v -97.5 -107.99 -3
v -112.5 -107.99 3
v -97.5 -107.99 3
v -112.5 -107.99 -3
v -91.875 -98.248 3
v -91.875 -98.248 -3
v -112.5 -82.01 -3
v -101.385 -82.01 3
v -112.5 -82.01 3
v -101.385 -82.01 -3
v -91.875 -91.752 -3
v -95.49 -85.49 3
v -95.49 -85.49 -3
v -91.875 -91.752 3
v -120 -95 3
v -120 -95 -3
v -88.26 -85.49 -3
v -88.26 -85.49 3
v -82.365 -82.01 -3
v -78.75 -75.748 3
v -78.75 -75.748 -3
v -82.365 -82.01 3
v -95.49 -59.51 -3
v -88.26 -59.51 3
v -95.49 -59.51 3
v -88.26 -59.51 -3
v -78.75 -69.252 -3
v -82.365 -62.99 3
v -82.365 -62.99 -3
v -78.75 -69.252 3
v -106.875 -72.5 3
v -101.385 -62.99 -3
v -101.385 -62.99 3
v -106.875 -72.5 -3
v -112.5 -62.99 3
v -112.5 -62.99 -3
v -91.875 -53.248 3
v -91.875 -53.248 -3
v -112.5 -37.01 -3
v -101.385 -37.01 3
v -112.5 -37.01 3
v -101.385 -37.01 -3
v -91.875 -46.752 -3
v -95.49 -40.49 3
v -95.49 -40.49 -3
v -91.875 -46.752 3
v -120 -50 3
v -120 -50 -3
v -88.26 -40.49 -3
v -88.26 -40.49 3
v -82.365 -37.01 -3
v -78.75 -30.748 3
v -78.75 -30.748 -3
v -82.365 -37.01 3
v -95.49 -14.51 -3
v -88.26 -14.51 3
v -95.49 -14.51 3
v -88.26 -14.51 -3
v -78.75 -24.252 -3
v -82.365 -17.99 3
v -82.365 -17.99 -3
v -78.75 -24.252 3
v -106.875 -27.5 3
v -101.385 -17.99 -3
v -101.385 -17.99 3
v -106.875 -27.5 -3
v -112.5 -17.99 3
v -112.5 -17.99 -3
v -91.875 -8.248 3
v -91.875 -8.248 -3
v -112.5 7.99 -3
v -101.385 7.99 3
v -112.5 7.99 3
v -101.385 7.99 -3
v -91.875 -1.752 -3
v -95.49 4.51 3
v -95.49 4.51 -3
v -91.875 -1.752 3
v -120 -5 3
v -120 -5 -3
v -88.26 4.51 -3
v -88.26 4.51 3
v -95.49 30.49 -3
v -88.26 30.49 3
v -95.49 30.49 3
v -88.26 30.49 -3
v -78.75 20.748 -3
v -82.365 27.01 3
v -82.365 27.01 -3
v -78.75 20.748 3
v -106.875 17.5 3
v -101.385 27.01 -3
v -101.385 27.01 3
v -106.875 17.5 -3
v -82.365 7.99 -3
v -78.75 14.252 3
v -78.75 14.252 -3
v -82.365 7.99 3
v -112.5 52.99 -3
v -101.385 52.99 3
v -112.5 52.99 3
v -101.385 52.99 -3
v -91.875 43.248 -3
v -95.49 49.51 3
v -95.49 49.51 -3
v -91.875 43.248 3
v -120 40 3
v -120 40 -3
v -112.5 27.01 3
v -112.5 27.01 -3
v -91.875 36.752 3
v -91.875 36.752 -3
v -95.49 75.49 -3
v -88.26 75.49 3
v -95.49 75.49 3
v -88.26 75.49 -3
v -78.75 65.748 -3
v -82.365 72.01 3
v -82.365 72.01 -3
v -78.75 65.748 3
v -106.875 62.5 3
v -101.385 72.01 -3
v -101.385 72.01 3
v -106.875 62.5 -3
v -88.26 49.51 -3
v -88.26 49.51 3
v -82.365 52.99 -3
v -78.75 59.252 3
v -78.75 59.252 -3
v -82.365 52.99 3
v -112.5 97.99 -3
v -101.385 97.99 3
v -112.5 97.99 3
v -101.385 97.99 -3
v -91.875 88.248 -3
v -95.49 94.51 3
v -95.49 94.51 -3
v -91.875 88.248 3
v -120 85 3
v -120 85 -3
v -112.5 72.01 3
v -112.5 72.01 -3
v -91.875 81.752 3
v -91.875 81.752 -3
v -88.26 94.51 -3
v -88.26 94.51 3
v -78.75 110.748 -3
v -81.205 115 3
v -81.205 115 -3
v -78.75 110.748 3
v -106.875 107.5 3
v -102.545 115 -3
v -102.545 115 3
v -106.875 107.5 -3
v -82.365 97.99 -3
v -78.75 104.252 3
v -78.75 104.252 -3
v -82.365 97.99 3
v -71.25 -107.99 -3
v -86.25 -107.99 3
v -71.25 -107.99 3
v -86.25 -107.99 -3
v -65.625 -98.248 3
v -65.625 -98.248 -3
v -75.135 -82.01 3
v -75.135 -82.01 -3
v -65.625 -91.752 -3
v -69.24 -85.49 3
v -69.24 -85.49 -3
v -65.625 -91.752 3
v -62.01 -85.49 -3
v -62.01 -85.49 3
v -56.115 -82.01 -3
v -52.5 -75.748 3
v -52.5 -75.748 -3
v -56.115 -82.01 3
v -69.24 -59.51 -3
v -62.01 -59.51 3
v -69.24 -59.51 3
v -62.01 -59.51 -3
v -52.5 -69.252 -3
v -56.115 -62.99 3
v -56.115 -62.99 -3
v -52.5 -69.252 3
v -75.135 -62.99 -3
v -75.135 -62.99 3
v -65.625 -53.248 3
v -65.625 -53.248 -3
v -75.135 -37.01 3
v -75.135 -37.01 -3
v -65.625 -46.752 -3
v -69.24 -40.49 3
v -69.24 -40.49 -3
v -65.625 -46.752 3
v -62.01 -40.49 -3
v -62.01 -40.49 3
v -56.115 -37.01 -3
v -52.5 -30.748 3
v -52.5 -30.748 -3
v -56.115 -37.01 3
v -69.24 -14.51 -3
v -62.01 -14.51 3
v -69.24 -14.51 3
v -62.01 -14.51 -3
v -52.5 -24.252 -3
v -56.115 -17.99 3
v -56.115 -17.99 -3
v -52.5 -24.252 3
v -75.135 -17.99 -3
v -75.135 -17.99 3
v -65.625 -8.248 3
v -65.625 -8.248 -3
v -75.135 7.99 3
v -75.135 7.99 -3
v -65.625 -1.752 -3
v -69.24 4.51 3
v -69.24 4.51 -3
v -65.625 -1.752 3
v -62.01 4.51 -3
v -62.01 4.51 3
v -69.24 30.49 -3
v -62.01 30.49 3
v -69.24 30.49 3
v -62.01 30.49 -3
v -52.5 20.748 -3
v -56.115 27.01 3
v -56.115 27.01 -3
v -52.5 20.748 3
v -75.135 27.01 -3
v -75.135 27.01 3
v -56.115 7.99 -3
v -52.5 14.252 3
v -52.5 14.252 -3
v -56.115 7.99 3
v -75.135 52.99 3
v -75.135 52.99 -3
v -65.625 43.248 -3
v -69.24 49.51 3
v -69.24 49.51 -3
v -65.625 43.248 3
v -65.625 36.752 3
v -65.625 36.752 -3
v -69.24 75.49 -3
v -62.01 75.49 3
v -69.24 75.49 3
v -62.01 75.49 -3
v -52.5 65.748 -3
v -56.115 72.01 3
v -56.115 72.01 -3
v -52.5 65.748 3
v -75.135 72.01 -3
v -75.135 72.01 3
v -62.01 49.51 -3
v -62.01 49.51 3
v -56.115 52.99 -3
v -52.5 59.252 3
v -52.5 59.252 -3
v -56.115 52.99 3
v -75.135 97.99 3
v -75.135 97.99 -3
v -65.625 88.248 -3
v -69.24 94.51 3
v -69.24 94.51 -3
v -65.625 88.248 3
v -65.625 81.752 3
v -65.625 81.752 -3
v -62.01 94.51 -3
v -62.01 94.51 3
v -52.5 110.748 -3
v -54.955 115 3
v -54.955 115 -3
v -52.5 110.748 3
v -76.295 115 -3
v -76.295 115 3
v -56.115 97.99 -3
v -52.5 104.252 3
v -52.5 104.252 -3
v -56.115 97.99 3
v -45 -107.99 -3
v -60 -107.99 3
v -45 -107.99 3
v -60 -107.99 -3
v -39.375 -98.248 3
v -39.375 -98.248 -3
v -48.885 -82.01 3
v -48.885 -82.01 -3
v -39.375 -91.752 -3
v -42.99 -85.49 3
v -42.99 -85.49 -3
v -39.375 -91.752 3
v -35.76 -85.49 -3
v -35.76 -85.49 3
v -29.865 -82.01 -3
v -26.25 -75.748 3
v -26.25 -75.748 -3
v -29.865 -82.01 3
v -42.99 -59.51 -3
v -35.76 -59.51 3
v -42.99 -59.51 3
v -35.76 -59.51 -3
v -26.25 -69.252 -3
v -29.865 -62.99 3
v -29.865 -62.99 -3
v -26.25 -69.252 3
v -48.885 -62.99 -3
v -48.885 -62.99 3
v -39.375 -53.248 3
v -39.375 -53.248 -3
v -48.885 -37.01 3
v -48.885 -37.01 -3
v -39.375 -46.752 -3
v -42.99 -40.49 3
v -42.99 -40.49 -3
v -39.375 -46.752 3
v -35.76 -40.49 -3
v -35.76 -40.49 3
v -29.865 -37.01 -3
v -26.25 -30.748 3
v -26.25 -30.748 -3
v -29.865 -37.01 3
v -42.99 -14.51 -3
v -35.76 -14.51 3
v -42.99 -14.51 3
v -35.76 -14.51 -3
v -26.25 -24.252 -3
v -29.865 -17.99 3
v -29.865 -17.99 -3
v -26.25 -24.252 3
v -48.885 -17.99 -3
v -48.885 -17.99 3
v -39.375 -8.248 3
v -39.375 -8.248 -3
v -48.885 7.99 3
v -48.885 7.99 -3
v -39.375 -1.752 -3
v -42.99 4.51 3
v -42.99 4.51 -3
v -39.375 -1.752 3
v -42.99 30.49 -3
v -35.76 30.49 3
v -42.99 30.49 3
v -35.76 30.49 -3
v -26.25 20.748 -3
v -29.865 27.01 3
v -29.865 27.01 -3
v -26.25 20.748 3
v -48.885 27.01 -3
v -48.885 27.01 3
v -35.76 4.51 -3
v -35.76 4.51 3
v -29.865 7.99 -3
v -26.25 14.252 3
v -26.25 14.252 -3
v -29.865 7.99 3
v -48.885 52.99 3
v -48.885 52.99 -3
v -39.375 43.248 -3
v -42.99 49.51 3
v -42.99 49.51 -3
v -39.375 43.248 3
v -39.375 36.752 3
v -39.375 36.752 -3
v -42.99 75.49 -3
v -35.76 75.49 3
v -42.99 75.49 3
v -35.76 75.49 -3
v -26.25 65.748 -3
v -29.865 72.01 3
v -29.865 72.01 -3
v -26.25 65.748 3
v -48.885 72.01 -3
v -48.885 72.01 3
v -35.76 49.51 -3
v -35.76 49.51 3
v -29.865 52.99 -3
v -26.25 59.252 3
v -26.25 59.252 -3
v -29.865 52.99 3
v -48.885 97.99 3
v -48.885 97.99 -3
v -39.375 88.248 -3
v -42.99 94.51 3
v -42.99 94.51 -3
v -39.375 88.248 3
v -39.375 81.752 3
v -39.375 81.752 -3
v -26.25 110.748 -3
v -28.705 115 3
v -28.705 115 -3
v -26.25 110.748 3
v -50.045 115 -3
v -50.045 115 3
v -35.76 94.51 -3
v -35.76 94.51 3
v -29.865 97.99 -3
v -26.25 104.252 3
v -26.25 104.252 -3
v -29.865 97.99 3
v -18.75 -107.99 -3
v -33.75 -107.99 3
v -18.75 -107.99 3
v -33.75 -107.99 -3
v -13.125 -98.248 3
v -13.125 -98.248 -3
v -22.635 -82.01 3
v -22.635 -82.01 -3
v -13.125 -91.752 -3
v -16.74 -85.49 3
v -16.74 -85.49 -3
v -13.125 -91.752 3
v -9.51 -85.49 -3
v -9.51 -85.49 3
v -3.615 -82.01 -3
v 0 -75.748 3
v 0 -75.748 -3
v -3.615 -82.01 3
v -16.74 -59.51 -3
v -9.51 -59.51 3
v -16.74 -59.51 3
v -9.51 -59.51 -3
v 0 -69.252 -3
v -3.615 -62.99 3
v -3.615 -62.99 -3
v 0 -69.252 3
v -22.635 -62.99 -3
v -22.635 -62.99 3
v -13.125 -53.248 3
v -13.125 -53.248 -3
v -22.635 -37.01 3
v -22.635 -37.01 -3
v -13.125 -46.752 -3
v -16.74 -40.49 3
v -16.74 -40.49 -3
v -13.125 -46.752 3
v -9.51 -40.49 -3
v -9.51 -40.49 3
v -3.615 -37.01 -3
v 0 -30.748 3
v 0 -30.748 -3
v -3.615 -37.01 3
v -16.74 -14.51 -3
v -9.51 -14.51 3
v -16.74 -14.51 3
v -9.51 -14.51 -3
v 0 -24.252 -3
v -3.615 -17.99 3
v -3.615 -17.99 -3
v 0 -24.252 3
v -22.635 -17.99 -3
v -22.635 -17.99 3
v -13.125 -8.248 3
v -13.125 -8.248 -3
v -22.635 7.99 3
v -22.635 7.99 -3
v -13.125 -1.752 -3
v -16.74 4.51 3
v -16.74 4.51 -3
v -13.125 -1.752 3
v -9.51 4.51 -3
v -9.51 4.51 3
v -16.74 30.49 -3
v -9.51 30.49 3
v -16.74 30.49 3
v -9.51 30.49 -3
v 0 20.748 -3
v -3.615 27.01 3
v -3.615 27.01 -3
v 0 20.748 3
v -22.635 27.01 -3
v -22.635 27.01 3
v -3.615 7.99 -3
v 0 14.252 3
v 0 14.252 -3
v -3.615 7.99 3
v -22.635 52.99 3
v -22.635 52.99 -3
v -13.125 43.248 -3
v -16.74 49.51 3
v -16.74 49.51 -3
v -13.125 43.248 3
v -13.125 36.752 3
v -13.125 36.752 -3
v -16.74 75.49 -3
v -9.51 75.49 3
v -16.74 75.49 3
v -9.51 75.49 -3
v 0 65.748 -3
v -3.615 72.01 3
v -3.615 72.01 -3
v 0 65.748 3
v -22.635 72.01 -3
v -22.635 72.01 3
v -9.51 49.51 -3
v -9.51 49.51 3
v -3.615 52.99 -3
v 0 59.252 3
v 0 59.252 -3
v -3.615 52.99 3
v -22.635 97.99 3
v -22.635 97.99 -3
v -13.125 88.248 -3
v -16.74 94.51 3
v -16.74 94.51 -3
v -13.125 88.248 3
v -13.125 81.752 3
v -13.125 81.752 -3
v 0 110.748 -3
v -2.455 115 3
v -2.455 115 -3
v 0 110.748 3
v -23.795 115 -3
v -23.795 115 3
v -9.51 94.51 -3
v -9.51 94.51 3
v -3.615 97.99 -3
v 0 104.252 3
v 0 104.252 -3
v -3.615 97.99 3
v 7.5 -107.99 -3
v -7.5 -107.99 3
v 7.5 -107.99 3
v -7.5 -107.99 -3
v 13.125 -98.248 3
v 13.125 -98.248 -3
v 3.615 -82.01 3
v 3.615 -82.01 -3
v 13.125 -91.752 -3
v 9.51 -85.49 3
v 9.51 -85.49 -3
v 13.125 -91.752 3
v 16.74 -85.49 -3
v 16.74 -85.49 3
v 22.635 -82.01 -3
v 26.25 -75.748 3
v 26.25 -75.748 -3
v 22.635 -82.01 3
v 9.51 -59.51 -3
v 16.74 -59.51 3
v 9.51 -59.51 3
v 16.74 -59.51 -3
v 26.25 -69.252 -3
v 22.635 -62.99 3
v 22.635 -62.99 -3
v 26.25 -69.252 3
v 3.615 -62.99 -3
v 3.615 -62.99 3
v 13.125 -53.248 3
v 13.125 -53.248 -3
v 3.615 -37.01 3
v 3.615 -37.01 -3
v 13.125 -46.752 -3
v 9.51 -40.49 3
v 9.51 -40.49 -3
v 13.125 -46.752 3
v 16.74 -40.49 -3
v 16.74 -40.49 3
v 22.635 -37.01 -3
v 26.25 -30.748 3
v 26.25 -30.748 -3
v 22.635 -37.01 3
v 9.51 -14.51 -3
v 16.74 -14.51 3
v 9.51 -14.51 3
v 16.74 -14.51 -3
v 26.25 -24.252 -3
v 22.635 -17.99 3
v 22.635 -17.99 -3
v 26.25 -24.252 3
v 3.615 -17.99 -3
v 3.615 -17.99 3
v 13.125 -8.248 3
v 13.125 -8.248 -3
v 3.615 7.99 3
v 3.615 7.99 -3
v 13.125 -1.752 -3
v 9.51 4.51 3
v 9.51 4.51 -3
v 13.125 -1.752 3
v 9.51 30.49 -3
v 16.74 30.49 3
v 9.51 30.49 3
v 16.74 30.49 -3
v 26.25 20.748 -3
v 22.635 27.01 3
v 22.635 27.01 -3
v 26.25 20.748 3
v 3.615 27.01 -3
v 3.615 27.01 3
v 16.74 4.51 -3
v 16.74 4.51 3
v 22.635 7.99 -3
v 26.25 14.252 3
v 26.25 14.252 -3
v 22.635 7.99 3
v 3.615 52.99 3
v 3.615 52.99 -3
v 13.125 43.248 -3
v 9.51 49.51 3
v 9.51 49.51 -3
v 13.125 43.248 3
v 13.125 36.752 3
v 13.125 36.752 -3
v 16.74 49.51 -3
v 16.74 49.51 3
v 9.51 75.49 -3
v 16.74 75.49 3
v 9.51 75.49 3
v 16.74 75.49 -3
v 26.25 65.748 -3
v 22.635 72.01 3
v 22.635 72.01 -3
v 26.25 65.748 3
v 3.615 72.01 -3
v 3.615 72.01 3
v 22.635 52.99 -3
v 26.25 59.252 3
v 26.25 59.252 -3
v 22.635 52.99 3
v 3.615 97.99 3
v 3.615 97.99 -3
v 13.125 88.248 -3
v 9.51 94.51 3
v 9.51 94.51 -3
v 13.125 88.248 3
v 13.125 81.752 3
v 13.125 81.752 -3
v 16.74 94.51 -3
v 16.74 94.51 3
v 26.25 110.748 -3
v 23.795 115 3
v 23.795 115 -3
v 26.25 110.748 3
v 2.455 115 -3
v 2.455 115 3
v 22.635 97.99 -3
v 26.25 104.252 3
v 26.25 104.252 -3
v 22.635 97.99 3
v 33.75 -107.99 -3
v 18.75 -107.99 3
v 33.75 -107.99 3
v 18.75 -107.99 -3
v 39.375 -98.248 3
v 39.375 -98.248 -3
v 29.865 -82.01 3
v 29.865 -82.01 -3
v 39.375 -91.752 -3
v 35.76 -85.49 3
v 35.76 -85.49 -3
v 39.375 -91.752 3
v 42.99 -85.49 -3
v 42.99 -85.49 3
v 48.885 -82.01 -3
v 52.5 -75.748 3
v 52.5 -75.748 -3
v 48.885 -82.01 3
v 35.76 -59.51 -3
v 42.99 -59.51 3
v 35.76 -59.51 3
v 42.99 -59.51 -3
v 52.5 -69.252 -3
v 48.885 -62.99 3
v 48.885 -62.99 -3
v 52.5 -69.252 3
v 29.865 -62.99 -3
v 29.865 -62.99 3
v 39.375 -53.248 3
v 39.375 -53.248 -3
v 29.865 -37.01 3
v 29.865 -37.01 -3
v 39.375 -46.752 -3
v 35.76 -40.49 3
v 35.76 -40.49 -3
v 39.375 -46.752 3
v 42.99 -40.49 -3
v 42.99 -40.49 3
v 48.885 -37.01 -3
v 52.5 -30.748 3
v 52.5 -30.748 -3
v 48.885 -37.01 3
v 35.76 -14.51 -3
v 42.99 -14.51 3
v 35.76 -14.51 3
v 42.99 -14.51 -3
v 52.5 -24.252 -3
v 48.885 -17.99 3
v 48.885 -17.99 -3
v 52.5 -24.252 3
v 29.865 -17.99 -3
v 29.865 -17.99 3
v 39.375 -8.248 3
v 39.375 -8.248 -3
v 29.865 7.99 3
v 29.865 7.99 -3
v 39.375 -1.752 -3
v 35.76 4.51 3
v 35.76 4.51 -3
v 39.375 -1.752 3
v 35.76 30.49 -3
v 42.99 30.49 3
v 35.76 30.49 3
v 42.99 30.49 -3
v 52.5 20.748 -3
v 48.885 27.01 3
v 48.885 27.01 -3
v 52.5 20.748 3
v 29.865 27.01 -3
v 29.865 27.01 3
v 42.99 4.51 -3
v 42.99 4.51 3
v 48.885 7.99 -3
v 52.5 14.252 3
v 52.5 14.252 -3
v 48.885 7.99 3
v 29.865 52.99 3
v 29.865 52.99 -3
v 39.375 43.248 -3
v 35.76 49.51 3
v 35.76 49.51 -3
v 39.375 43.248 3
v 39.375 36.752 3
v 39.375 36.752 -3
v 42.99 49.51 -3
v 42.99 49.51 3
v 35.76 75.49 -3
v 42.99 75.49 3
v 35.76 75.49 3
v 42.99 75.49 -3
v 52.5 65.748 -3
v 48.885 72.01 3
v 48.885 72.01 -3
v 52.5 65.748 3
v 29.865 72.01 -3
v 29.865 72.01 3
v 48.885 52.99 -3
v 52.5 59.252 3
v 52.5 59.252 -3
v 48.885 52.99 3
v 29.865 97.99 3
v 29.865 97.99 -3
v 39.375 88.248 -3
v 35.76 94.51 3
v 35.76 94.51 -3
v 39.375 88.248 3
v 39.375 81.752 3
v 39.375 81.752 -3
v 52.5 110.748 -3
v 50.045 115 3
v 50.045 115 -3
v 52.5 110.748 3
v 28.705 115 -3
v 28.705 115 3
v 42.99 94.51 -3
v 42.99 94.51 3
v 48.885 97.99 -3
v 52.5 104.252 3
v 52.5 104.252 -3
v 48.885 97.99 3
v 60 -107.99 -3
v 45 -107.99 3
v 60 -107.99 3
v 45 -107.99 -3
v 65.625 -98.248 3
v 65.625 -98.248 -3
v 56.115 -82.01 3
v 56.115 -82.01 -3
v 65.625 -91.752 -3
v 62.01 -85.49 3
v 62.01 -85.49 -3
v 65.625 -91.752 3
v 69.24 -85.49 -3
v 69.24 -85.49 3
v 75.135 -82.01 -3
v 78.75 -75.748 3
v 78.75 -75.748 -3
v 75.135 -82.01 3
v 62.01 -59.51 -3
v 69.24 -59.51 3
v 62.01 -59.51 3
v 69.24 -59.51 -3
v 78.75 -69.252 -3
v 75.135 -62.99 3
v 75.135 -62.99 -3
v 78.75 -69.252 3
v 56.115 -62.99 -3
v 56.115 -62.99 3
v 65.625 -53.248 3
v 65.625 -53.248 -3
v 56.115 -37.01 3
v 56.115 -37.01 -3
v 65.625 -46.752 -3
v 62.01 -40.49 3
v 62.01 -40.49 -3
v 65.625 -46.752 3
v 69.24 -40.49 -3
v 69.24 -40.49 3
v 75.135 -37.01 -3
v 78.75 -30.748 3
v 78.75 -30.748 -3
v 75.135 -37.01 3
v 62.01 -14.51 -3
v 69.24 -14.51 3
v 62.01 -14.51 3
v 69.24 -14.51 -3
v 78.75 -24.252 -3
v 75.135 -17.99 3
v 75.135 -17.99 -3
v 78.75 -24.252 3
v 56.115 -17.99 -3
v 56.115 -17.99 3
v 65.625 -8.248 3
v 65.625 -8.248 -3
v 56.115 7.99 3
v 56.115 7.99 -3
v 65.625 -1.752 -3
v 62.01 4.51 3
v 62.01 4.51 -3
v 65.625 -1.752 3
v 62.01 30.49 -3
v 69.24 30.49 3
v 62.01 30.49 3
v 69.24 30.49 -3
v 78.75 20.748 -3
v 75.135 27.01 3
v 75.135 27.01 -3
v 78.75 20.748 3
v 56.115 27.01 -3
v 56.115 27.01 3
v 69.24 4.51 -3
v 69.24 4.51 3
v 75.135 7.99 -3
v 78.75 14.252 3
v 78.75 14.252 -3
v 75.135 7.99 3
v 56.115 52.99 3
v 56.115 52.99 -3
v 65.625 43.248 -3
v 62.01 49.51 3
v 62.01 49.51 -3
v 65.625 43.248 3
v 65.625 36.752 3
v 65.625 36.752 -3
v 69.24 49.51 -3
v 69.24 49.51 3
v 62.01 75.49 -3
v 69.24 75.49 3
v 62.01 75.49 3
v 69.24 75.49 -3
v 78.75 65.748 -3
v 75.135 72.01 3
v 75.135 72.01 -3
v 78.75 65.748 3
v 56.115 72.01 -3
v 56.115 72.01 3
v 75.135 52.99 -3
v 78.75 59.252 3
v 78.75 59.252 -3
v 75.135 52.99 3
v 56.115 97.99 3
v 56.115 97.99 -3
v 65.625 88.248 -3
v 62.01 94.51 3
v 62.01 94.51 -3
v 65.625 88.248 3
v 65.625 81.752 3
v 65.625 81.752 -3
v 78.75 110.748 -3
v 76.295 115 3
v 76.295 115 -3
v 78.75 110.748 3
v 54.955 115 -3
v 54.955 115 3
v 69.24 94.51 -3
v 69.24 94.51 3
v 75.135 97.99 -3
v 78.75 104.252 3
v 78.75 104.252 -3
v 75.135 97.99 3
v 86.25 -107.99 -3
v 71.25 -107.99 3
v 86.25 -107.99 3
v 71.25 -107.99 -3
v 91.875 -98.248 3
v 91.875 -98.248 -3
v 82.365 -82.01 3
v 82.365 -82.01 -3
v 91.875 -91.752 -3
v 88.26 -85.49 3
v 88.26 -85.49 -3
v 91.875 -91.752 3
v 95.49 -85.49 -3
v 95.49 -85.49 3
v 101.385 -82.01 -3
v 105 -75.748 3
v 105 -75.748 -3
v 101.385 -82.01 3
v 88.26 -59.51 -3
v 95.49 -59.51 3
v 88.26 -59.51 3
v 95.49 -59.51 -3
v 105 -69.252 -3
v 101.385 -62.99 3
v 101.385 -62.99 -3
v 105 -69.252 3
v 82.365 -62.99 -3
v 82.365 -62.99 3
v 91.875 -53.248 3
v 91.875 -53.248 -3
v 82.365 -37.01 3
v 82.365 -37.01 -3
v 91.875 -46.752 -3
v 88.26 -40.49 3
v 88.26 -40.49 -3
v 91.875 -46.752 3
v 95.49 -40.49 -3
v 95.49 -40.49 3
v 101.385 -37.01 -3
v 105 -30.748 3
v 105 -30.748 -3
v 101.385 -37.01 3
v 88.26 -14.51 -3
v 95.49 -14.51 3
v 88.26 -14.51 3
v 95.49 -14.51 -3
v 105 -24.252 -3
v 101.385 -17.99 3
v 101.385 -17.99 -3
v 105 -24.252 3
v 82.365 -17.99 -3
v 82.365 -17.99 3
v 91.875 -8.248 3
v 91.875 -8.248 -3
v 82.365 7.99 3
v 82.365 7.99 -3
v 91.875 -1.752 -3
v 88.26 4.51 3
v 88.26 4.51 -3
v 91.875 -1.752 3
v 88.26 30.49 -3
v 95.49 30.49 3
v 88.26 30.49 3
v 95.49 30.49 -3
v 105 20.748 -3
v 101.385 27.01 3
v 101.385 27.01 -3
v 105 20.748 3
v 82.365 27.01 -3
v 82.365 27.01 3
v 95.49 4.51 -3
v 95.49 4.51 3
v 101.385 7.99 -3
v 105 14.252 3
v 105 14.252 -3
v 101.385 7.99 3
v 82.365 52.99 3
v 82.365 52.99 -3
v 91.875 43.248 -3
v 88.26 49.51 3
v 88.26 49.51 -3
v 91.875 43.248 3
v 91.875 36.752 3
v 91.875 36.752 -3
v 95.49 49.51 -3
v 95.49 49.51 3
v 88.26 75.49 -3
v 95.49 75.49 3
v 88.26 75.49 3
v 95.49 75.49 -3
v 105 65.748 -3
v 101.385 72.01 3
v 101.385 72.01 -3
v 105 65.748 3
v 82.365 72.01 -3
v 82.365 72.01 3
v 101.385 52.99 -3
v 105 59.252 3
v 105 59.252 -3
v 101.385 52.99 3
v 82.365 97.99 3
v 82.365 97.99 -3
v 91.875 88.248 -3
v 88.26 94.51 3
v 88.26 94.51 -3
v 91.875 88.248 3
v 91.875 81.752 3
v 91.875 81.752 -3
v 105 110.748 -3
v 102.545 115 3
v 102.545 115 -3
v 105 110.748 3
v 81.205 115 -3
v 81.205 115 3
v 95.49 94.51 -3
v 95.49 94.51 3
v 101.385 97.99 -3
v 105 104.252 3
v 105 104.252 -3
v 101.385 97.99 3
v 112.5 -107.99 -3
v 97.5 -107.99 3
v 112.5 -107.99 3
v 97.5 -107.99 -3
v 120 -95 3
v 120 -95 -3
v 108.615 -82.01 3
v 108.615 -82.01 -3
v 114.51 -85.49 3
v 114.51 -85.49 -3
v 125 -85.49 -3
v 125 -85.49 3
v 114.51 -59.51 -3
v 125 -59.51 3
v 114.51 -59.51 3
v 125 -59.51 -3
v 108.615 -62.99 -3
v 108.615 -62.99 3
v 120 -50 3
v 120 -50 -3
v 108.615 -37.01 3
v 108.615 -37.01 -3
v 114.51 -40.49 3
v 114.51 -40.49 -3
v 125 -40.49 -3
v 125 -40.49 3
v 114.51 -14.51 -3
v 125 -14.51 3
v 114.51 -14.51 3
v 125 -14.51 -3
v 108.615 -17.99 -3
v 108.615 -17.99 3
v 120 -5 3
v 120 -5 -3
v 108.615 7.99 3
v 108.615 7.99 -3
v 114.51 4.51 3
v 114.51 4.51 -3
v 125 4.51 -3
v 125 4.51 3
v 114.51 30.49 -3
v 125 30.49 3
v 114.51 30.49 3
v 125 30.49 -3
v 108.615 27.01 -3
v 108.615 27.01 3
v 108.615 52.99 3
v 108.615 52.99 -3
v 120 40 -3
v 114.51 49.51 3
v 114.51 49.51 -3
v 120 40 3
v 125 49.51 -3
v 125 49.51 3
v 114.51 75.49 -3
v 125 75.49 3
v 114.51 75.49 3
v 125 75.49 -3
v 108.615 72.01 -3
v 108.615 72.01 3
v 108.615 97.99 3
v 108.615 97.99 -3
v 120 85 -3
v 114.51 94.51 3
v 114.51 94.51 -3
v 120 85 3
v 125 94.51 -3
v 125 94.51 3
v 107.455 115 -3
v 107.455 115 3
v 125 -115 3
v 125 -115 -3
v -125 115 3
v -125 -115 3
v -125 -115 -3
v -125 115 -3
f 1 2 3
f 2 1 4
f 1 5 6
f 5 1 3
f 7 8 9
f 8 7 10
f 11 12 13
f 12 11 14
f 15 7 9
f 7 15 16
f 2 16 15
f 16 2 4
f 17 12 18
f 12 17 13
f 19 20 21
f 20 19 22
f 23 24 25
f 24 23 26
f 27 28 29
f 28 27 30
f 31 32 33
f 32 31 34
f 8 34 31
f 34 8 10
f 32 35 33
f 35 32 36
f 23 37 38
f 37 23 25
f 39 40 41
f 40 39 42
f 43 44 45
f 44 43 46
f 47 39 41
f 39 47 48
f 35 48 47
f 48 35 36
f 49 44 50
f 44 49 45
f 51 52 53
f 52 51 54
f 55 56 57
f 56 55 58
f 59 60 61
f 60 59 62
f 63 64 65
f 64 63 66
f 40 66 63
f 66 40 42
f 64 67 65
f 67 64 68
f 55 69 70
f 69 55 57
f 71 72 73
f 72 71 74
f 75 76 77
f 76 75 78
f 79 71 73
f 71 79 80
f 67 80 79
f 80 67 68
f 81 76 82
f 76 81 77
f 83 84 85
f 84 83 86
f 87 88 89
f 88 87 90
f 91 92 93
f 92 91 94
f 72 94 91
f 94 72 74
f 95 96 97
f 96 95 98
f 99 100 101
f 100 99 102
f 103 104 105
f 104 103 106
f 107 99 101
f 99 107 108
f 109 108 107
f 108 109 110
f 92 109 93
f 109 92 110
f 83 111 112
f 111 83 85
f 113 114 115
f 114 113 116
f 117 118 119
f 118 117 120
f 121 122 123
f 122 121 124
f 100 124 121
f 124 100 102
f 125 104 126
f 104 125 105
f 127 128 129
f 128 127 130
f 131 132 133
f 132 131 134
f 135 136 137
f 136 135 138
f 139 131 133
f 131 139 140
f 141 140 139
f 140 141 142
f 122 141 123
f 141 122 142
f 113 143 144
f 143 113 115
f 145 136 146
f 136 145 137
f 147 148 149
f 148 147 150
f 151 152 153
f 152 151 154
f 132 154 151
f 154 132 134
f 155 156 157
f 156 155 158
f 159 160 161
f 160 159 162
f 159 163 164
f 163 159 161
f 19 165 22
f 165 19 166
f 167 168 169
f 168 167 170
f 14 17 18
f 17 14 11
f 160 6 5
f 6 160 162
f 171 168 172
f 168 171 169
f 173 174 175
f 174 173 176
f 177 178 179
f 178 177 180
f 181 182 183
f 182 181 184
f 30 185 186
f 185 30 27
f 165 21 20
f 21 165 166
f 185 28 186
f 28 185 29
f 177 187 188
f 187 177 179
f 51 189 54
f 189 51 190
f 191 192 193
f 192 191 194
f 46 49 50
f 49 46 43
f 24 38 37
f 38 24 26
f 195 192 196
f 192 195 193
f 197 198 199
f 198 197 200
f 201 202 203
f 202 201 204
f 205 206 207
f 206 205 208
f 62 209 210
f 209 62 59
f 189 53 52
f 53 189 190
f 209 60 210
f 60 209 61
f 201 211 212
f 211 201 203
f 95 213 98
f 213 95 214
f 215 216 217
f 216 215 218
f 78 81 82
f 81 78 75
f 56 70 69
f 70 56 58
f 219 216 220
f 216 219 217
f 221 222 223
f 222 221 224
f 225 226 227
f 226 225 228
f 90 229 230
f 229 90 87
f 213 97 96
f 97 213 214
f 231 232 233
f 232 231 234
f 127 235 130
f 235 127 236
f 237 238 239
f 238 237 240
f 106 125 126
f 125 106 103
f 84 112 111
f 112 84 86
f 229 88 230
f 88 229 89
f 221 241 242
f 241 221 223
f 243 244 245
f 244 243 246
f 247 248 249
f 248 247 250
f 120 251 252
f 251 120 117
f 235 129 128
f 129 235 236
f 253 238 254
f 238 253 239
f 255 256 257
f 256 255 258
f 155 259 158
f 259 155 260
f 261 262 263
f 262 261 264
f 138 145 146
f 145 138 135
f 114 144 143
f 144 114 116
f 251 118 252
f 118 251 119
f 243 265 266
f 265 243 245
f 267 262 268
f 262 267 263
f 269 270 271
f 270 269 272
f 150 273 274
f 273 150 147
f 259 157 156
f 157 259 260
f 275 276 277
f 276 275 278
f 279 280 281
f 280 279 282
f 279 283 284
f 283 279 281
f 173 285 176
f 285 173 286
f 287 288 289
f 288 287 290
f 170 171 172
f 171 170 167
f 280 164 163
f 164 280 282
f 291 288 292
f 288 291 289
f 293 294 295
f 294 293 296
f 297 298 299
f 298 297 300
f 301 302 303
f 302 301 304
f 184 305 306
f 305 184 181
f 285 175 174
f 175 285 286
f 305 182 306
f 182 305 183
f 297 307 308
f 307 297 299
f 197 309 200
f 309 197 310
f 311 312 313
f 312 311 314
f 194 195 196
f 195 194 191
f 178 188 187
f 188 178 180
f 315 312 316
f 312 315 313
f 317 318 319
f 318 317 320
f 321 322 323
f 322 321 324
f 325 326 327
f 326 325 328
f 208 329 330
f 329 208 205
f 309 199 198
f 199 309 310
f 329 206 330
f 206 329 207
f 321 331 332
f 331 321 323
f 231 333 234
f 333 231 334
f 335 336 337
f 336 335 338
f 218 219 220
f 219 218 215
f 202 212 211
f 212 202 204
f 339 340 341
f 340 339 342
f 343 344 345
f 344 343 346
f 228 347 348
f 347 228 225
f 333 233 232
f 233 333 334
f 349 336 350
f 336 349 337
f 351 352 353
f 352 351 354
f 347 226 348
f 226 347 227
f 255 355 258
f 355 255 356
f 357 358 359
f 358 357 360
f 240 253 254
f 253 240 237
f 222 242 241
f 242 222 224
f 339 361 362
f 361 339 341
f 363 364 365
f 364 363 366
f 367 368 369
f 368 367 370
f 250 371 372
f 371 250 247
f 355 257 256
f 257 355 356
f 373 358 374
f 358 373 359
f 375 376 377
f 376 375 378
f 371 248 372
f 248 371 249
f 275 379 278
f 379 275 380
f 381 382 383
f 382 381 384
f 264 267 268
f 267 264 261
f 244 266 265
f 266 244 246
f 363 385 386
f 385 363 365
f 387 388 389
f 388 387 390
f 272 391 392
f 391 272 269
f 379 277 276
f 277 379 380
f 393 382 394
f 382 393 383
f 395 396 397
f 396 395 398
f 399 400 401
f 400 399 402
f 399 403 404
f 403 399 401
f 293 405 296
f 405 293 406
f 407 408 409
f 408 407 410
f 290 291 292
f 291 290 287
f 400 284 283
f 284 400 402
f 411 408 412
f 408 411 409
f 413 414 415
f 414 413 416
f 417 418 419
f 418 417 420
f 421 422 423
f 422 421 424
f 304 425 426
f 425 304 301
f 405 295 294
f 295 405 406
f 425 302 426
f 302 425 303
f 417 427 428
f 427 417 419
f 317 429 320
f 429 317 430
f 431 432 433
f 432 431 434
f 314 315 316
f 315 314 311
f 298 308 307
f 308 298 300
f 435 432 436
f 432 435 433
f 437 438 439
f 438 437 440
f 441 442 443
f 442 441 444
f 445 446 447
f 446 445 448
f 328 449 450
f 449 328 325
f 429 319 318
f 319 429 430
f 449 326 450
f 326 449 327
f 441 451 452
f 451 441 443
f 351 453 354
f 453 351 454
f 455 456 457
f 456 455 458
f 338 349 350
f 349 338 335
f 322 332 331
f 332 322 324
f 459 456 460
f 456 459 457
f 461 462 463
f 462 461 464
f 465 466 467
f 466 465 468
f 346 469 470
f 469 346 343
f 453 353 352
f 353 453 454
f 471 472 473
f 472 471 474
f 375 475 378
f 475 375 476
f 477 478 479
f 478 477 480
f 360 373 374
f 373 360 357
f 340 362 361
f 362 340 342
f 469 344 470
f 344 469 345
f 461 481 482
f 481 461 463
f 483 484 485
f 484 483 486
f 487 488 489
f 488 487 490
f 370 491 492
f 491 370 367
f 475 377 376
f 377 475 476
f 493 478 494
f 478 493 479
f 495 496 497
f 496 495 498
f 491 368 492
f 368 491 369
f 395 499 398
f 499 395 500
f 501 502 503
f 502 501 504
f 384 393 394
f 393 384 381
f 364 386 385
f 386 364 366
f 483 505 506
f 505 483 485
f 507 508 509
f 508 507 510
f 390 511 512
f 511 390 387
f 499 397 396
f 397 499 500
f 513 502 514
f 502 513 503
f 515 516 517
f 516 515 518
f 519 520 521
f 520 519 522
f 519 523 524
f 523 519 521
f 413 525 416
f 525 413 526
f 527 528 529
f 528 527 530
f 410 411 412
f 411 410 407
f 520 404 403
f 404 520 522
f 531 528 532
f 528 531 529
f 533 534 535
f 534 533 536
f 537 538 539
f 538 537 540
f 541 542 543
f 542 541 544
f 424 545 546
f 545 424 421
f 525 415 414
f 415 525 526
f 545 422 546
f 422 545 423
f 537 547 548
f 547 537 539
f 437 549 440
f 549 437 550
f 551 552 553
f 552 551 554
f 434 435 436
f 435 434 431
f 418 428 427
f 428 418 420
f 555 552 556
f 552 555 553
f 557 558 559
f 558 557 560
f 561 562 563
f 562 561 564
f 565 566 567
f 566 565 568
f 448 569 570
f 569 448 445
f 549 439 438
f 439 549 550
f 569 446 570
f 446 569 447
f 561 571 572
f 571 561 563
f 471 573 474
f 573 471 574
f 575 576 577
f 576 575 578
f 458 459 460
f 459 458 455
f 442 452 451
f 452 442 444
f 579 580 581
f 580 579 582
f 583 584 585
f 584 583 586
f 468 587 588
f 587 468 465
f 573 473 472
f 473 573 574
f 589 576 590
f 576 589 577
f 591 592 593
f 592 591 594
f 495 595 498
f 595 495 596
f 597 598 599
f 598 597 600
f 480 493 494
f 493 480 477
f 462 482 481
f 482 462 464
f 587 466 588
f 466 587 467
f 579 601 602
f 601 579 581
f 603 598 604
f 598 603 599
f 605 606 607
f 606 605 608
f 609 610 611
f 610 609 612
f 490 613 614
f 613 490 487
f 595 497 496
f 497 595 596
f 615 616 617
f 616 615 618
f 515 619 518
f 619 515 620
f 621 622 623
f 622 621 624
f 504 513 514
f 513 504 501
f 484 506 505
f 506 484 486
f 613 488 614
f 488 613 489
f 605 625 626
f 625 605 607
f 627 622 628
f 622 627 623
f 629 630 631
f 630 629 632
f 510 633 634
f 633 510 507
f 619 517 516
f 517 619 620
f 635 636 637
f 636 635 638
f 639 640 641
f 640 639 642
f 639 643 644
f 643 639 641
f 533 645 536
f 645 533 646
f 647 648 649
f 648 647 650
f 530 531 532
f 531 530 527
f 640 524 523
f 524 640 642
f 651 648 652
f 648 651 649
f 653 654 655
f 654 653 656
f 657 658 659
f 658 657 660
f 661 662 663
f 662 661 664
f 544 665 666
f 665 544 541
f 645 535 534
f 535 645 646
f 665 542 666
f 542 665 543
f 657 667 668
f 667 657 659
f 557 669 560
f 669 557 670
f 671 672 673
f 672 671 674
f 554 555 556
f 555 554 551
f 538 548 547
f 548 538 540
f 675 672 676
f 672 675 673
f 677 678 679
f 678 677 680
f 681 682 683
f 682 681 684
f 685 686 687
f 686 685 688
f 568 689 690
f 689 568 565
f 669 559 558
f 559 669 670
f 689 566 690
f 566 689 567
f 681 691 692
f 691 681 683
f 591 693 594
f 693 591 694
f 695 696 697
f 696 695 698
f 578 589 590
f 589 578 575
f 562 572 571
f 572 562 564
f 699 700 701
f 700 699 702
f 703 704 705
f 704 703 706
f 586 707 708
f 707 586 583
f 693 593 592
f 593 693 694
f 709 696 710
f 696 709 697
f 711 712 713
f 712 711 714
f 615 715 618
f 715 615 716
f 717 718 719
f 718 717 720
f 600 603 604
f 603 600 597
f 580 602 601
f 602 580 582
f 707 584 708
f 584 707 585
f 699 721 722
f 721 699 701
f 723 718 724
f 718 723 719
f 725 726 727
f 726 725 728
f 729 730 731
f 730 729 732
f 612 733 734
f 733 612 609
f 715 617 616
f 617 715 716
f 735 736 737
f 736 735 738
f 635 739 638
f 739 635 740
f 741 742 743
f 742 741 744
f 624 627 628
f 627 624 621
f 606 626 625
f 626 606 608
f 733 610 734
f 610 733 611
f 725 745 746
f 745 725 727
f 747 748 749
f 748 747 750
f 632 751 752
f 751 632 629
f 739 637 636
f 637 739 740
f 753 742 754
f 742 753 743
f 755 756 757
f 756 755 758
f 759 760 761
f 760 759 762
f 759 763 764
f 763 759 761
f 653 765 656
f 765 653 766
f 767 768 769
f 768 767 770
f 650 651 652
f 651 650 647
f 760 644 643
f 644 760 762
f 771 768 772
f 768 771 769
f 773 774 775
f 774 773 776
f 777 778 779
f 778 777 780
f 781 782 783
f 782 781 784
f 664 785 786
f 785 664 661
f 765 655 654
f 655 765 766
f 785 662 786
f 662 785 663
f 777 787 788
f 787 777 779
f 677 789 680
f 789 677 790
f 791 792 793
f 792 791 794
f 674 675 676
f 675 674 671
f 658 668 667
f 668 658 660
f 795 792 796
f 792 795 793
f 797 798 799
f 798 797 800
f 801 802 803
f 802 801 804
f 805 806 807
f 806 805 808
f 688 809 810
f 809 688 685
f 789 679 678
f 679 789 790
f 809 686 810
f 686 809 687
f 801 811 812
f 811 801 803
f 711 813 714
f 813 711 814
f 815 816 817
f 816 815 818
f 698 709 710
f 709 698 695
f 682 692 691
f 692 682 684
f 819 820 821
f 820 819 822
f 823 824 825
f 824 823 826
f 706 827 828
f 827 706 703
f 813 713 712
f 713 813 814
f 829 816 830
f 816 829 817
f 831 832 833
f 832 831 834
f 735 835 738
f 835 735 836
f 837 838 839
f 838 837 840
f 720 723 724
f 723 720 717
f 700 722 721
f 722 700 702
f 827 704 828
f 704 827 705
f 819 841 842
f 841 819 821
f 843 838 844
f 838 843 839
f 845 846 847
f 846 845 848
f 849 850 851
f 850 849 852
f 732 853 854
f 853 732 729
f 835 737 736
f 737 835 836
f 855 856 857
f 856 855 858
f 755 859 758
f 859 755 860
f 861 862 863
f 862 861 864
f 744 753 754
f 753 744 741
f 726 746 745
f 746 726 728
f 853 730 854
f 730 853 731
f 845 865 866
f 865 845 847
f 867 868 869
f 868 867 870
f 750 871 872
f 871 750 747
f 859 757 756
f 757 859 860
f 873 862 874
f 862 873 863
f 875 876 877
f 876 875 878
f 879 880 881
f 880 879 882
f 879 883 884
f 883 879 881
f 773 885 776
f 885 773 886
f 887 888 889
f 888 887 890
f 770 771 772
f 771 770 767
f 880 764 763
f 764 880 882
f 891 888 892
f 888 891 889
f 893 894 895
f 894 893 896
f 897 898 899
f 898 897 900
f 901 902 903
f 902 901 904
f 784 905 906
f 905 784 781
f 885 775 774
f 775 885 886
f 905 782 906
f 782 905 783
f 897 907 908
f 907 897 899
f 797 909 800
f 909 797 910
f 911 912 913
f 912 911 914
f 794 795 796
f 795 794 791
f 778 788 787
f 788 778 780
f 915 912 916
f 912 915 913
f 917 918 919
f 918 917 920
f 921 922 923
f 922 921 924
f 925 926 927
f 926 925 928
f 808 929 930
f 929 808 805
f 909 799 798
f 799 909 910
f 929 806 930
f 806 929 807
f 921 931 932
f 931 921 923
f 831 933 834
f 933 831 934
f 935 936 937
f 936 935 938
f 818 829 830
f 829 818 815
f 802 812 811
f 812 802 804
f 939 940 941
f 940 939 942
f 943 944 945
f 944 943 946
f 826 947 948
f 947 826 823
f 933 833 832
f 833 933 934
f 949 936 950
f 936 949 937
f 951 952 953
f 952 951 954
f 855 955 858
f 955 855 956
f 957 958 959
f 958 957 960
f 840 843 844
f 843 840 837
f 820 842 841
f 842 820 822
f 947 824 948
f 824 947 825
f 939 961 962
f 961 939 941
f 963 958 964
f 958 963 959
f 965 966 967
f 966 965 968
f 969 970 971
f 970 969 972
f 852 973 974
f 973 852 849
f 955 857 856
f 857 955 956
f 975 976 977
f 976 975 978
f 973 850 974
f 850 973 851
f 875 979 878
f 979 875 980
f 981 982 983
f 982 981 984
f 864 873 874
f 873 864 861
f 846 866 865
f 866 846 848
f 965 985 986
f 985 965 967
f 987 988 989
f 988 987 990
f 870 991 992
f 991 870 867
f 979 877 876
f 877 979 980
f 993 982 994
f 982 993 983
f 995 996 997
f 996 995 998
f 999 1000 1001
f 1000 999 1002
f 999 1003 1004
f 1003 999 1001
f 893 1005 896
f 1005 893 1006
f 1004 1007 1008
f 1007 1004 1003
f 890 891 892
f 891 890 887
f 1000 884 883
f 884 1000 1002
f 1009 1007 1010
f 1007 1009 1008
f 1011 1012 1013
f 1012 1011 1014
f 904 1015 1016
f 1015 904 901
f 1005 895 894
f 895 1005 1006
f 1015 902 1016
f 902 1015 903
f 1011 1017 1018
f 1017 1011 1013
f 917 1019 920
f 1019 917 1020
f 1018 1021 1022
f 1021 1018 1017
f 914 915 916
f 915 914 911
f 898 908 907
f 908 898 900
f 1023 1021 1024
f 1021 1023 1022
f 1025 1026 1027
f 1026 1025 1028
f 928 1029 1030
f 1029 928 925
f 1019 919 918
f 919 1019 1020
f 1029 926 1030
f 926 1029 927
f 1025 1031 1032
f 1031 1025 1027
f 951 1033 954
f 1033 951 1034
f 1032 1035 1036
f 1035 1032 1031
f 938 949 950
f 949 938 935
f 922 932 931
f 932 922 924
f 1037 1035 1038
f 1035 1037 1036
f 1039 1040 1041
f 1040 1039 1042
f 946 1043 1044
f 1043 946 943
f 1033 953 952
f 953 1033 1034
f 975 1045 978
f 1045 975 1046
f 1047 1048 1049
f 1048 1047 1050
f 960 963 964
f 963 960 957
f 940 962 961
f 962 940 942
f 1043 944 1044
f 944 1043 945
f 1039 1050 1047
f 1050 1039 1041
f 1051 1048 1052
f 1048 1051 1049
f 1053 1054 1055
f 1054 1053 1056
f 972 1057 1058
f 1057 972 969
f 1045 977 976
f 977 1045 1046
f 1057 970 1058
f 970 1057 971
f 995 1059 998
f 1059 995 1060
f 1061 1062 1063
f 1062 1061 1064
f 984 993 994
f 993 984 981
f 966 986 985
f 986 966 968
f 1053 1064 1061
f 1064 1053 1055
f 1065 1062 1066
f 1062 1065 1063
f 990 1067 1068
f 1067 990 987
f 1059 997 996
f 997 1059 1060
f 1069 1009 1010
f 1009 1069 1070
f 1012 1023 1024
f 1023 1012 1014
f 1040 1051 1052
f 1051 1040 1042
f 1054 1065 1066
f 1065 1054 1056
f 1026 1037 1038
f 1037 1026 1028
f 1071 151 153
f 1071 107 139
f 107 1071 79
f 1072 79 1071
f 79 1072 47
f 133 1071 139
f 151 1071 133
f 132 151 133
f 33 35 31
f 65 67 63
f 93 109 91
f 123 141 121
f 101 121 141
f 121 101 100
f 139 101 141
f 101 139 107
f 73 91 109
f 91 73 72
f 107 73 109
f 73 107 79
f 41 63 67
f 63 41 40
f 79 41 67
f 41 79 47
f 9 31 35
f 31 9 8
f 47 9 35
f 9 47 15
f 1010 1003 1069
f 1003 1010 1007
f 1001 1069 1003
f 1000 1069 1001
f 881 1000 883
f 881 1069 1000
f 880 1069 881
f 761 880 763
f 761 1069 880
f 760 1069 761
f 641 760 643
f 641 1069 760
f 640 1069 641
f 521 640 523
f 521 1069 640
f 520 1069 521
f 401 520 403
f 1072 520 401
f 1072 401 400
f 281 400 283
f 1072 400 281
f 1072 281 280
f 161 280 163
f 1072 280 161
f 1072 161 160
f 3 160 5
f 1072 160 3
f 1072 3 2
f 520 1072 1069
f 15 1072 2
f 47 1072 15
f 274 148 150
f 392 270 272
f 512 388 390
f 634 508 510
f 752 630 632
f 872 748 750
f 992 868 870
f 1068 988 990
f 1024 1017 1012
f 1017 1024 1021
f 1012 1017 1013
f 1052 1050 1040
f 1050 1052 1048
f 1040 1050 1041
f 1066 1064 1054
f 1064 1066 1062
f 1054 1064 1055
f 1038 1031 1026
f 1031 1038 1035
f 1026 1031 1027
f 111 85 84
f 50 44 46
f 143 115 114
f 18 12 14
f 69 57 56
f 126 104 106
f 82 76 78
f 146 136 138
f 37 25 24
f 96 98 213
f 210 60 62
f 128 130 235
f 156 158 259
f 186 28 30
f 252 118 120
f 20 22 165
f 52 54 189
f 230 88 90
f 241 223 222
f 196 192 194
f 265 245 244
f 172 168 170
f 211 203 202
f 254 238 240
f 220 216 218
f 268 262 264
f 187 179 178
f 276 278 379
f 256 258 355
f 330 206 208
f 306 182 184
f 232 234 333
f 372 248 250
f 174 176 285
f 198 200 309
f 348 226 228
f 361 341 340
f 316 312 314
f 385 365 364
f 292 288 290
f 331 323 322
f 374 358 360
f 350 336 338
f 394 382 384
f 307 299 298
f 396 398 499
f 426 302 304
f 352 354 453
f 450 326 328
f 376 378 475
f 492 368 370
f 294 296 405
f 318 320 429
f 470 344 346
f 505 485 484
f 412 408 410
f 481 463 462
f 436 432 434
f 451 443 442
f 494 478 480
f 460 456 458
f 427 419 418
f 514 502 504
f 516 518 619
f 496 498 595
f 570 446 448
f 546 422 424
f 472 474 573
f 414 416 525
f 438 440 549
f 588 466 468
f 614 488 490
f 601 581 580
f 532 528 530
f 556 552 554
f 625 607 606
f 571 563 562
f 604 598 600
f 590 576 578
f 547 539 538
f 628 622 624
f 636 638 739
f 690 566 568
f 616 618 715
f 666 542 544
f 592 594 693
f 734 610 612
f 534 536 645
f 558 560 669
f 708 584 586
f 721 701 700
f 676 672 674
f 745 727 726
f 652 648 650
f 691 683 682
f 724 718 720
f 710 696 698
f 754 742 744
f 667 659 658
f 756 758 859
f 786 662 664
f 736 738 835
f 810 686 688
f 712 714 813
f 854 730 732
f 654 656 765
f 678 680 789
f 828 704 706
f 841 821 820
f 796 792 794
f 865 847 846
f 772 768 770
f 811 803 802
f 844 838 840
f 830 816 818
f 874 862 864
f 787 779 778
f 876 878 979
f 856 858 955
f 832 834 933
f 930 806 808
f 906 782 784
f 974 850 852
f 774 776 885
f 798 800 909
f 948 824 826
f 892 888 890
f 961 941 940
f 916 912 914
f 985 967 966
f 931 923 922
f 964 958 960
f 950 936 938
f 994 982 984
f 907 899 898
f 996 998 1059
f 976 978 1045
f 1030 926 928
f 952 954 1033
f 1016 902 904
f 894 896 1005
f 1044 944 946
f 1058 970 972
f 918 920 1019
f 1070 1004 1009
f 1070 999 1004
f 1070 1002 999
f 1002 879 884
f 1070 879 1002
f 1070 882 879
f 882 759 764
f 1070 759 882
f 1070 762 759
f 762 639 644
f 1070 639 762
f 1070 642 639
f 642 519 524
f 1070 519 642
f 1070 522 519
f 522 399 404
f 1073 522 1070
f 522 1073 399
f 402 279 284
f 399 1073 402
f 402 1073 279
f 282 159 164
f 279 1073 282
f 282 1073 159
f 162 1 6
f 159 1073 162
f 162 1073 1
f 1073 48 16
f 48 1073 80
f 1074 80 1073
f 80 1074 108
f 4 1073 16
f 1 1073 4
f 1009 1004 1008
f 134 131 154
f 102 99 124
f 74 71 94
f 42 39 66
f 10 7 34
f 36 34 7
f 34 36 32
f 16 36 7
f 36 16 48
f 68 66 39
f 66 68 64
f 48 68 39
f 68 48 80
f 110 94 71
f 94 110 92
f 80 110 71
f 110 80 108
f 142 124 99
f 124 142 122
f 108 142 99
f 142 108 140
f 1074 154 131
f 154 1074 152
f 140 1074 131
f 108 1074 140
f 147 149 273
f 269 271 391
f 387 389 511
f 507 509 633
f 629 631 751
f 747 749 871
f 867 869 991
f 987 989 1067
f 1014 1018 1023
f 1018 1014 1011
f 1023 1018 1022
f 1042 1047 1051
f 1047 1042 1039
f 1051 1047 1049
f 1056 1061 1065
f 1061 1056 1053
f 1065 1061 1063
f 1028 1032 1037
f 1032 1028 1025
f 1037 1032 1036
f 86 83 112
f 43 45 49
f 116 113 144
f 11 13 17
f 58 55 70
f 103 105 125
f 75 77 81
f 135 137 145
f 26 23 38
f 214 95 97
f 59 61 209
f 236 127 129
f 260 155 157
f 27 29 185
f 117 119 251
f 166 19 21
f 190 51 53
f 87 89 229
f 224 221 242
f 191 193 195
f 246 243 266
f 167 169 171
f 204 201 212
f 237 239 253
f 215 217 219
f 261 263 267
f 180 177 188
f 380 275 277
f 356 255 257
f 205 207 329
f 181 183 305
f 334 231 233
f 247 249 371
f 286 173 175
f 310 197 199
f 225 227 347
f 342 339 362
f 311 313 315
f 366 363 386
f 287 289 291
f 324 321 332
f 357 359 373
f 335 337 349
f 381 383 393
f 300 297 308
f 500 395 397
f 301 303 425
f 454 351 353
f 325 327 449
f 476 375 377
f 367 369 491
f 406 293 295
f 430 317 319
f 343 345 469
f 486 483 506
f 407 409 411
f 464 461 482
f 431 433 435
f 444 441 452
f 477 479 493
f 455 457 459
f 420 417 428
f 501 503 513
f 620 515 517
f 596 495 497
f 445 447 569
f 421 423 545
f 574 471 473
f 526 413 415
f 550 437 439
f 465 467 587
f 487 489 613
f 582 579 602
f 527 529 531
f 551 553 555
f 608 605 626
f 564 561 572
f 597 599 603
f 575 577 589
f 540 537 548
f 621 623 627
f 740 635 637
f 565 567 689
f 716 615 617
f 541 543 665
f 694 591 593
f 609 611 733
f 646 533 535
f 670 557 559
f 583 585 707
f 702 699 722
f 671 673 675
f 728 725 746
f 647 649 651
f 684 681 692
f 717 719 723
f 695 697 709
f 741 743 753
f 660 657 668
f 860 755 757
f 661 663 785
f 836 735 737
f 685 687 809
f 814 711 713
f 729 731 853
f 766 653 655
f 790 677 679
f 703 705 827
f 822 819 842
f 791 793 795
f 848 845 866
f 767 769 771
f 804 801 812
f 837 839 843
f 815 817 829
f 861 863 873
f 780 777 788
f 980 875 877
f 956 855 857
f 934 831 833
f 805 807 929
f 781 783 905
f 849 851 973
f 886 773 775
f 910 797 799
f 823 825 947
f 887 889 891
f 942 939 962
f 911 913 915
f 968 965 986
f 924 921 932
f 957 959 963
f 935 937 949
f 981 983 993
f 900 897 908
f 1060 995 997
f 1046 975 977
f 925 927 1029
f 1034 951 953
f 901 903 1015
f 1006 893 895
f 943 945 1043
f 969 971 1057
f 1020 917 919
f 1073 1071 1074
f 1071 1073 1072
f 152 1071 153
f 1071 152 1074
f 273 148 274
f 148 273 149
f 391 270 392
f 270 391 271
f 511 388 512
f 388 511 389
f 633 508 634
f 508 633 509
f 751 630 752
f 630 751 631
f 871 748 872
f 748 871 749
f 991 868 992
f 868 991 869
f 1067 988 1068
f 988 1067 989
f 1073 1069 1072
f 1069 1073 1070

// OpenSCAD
// Dimensões baseadas na imagem
largura = 250;
altura = 230;
espessura = 6;
raio_hex = 15; 

difference() {
    // Bloco principal do porta medalhas
    cube([largura, altura, espessura], center = true);
    
    // Furos estilo colmeia
    for (x = [-largura/2 + 20 : raio_hex * 1.75 : largura/2 - 20]) {
        for (y = [-altura/2 + 20 : raio_hex * 3 : altura/2 - 20]) {
            translate([x, y, 0])
                cylinder(h = espessura + 2, r = raio_hex, $fn = 6, center = true);
            
            translate([x + (raio_hex * 1.75)/2, y + (raio_hex * 3)/2, 0])
                cylinder(h = espessura + 2, r = raio_hex, $fn = 6, center = true);
        }
    }
}
